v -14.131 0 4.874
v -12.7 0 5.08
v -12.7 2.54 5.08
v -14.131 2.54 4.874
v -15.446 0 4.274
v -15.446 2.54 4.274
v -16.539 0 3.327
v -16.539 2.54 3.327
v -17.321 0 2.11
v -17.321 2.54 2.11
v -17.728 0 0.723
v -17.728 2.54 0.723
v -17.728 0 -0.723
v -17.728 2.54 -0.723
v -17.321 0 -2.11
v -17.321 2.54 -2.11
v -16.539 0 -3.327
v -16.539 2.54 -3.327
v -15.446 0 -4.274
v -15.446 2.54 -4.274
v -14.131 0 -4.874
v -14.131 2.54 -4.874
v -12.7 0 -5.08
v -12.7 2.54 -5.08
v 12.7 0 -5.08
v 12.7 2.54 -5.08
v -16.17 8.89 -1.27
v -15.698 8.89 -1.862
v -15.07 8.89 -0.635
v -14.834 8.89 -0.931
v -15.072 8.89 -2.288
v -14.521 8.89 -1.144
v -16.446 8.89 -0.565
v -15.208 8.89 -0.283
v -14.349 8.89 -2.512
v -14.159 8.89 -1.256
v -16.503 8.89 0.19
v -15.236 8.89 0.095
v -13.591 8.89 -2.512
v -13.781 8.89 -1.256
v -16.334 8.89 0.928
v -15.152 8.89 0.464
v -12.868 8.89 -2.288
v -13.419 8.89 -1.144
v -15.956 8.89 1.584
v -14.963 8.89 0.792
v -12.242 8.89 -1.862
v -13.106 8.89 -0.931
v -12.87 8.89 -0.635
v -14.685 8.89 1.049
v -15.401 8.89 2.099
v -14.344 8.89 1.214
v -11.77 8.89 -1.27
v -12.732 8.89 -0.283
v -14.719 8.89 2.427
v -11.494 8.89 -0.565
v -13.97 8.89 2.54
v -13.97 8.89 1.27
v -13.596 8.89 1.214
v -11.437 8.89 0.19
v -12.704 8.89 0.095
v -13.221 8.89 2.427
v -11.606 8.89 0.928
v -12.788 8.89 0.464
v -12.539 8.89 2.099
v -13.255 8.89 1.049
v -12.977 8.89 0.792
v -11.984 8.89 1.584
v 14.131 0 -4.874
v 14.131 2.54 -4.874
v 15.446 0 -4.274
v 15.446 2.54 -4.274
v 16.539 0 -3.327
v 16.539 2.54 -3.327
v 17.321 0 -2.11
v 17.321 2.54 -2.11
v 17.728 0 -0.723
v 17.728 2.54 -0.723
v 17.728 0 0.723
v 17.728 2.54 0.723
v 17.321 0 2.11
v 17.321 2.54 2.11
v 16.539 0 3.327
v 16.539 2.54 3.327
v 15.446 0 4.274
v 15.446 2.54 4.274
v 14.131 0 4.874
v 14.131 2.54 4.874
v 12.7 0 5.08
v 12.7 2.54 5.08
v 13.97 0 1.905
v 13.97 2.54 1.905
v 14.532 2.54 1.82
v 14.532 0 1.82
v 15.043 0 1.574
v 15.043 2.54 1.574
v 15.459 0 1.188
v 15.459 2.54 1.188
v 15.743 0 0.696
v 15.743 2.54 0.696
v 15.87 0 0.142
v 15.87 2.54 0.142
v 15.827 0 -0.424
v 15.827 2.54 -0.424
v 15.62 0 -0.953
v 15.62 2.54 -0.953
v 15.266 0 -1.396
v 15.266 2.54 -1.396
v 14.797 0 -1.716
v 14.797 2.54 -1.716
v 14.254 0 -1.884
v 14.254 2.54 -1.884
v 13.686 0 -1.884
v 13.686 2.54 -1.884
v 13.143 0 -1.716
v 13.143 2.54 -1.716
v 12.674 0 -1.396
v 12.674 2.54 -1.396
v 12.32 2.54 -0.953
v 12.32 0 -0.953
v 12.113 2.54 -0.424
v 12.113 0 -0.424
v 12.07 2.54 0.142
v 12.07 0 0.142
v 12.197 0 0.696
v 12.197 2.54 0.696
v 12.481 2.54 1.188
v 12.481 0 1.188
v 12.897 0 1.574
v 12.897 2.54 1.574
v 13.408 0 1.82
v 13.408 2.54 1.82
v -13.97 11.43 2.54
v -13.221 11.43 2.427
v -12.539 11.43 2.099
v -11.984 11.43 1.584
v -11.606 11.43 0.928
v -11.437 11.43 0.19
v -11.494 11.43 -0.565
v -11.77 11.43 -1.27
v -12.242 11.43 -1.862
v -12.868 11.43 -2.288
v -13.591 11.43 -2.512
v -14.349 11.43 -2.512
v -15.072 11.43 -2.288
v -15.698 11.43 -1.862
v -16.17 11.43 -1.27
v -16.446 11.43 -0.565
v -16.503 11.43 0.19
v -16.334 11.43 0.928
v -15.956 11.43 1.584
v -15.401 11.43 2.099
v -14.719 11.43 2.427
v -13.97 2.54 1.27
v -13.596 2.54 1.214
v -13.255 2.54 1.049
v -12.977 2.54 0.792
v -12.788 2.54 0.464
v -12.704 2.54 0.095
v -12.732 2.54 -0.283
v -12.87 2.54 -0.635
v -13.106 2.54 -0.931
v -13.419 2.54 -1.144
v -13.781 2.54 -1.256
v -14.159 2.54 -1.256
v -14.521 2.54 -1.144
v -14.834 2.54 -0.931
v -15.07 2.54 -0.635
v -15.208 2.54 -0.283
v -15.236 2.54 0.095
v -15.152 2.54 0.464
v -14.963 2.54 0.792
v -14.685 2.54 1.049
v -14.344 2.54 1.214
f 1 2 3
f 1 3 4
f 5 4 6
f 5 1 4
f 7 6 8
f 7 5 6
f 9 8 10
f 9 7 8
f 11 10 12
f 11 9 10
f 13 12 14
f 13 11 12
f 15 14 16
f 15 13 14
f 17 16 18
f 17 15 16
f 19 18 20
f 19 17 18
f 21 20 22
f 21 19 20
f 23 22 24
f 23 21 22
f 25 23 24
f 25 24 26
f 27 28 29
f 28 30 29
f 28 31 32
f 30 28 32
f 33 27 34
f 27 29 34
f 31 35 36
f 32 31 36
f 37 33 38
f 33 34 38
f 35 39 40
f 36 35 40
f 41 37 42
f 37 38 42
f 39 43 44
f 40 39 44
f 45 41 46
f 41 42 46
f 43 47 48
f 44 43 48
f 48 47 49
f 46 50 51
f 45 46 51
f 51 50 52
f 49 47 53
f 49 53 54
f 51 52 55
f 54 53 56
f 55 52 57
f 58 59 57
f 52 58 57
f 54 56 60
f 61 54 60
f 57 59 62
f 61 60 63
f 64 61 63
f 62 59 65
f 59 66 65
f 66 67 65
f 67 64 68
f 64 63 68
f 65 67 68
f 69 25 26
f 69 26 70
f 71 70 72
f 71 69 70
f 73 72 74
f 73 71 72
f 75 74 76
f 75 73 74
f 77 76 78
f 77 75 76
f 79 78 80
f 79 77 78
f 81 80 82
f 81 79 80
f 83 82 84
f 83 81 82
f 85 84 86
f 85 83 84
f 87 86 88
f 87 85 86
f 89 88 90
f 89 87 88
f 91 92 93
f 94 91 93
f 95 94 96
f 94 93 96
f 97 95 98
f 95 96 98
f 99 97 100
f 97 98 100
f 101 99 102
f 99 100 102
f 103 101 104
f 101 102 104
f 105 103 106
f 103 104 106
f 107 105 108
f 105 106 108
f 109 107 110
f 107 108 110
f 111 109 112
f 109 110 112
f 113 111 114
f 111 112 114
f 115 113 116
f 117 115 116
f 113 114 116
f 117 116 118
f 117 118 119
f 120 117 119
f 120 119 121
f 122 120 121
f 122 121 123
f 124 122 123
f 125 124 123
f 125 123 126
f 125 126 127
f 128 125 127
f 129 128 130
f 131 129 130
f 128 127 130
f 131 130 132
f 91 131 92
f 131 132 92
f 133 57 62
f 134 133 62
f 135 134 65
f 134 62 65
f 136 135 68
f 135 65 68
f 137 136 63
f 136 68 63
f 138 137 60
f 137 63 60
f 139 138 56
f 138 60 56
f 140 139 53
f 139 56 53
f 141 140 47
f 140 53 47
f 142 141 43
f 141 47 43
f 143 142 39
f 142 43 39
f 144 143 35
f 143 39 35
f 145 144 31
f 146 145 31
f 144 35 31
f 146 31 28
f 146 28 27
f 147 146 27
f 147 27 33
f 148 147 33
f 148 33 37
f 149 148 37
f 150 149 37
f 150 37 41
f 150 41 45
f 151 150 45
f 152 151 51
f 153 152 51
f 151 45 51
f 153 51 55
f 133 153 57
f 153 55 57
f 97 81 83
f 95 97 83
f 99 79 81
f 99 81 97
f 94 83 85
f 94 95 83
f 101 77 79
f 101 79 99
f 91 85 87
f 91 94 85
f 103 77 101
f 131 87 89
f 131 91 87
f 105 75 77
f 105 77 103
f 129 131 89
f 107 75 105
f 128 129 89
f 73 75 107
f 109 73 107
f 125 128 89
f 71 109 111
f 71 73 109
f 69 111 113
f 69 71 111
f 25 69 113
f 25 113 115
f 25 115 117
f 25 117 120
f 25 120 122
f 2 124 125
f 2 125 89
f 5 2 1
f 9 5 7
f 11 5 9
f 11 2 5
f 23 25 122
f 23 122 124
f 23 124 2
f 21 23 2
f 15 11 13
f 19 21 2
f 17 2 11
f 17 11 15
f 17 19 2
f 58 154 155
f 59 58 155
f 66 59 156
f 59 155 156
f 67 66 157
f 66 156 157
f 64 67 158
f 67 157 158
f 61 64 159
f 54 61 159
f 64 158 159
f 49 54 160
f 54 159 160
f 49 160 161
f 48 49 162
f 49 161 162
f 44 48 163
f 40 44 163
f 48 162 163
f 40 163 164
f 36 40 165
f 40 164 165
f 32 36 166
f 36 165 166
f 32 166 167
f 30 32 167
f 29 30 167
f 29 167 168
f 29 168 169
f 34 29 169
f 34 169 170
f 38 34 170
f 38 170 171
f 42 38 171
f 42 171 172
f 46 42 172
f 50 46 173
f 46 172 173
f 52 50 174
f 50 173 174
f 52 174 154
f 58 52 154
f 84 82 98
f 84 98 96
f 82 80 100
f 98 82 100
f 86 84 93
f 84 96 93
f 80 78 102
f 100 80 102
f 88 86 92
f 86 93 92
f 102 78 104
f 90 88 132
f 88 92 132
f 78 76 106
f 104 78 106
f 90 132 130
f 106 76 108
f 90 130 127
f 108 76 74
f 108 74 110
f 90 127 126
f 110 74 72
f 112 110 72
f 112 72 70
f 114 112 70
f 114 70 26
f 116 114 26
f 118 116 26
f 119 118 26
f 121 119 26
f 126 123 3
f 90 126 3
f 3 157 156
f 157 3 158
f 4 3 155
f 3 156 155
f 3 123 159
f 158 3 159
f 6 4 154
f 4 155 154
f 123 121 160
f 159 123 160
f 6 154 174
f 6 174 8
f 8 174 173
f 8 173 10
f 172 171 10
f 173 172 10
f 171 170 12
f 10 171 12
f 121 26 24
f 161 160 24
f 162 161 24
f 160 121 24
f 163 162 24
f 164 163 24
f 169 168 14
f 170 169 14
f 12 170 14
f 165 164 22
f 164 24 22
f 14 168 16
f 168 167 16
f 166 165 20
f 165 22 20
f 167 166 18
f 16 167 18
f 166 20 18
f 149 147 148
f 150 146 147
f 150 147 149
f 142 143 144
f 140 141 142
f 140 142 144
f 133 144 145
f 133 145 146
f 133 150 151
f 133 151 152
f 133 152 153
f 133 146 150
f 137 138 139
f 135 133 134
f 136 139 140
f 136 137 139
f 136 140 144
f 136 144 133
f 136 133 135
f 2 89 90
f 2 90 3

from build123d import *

# Parameters (mm, degrees)
BATON_DEPTH       = 2.54
SKETCH2_R         = 1.27
JOIN_DEPTH        = 6.35
SKETCH4_R         = 2.54
JOINER_CAP_DEPTH  = 2.54
SKETCH5_R         = 1.905
JOINER_HOLE_DEPTH = 2.54


with BuildPart() as part:
    # Sketch1 → baton (new body)
    with BuildSketch(Plane(origin=(0, 0, 0), x_dir=(1, 0, 0), z_dir=(0, 1, 0))):
        with BuildLine():
            Line((-12.7, 5.08), (12.7, 5.08))
            ThreePointArc((12.7, 5.08), (17.78, 0), (12.7, -5.08))
            Line((12.7, -5.08), (-12.7, -5.08))
            ThreePointArc((-12.7, -5.08), (-17.78, 0), (-12.7, 5.08))
        make_face()
    extrude(amount=BATON_DEPTH)

    # Sketch2 → join (add)
    with BuildSketch(Plane(origin=(0, 2.54, 0), x_dir=(1, 0, 0), z_dir=(0, 1, 0))):
        with Locations(Location((-13.97, 0, 0), (0, 0, 270))):
            Circle(SKETCH2_R)
    extrude(amount=JOIN_DEPTH)

    # Sketch4 → joiner cap (add)
    with BuildSketch(Plane(origin=(0, 8.89, 0), x_dir=(1, 0, 0), z_dir=(0, 1, 0))):
        with Locations(Location((-13.97, 0, 0), (0, 0, 270))):
            Circle(SKETCH4_R)
    extrude(amount=JOINER_CAP_DEPTH)

    # Sketch5 → joiner hole (cut)
    with BuildSketch(Plane(origin=(0, 2.54, 0), x_dir=(1, 0, 0), z_dir=(0, 1, 0))):
        with Locations(Location((13.97, 0, 0), (0, 0, 270))):
            Circle(SKETCH5_R)
    extrude(amount=-JOINER_HOLE_DEPTH, mode=Mode.SUBTRACT)


solid = part.part
